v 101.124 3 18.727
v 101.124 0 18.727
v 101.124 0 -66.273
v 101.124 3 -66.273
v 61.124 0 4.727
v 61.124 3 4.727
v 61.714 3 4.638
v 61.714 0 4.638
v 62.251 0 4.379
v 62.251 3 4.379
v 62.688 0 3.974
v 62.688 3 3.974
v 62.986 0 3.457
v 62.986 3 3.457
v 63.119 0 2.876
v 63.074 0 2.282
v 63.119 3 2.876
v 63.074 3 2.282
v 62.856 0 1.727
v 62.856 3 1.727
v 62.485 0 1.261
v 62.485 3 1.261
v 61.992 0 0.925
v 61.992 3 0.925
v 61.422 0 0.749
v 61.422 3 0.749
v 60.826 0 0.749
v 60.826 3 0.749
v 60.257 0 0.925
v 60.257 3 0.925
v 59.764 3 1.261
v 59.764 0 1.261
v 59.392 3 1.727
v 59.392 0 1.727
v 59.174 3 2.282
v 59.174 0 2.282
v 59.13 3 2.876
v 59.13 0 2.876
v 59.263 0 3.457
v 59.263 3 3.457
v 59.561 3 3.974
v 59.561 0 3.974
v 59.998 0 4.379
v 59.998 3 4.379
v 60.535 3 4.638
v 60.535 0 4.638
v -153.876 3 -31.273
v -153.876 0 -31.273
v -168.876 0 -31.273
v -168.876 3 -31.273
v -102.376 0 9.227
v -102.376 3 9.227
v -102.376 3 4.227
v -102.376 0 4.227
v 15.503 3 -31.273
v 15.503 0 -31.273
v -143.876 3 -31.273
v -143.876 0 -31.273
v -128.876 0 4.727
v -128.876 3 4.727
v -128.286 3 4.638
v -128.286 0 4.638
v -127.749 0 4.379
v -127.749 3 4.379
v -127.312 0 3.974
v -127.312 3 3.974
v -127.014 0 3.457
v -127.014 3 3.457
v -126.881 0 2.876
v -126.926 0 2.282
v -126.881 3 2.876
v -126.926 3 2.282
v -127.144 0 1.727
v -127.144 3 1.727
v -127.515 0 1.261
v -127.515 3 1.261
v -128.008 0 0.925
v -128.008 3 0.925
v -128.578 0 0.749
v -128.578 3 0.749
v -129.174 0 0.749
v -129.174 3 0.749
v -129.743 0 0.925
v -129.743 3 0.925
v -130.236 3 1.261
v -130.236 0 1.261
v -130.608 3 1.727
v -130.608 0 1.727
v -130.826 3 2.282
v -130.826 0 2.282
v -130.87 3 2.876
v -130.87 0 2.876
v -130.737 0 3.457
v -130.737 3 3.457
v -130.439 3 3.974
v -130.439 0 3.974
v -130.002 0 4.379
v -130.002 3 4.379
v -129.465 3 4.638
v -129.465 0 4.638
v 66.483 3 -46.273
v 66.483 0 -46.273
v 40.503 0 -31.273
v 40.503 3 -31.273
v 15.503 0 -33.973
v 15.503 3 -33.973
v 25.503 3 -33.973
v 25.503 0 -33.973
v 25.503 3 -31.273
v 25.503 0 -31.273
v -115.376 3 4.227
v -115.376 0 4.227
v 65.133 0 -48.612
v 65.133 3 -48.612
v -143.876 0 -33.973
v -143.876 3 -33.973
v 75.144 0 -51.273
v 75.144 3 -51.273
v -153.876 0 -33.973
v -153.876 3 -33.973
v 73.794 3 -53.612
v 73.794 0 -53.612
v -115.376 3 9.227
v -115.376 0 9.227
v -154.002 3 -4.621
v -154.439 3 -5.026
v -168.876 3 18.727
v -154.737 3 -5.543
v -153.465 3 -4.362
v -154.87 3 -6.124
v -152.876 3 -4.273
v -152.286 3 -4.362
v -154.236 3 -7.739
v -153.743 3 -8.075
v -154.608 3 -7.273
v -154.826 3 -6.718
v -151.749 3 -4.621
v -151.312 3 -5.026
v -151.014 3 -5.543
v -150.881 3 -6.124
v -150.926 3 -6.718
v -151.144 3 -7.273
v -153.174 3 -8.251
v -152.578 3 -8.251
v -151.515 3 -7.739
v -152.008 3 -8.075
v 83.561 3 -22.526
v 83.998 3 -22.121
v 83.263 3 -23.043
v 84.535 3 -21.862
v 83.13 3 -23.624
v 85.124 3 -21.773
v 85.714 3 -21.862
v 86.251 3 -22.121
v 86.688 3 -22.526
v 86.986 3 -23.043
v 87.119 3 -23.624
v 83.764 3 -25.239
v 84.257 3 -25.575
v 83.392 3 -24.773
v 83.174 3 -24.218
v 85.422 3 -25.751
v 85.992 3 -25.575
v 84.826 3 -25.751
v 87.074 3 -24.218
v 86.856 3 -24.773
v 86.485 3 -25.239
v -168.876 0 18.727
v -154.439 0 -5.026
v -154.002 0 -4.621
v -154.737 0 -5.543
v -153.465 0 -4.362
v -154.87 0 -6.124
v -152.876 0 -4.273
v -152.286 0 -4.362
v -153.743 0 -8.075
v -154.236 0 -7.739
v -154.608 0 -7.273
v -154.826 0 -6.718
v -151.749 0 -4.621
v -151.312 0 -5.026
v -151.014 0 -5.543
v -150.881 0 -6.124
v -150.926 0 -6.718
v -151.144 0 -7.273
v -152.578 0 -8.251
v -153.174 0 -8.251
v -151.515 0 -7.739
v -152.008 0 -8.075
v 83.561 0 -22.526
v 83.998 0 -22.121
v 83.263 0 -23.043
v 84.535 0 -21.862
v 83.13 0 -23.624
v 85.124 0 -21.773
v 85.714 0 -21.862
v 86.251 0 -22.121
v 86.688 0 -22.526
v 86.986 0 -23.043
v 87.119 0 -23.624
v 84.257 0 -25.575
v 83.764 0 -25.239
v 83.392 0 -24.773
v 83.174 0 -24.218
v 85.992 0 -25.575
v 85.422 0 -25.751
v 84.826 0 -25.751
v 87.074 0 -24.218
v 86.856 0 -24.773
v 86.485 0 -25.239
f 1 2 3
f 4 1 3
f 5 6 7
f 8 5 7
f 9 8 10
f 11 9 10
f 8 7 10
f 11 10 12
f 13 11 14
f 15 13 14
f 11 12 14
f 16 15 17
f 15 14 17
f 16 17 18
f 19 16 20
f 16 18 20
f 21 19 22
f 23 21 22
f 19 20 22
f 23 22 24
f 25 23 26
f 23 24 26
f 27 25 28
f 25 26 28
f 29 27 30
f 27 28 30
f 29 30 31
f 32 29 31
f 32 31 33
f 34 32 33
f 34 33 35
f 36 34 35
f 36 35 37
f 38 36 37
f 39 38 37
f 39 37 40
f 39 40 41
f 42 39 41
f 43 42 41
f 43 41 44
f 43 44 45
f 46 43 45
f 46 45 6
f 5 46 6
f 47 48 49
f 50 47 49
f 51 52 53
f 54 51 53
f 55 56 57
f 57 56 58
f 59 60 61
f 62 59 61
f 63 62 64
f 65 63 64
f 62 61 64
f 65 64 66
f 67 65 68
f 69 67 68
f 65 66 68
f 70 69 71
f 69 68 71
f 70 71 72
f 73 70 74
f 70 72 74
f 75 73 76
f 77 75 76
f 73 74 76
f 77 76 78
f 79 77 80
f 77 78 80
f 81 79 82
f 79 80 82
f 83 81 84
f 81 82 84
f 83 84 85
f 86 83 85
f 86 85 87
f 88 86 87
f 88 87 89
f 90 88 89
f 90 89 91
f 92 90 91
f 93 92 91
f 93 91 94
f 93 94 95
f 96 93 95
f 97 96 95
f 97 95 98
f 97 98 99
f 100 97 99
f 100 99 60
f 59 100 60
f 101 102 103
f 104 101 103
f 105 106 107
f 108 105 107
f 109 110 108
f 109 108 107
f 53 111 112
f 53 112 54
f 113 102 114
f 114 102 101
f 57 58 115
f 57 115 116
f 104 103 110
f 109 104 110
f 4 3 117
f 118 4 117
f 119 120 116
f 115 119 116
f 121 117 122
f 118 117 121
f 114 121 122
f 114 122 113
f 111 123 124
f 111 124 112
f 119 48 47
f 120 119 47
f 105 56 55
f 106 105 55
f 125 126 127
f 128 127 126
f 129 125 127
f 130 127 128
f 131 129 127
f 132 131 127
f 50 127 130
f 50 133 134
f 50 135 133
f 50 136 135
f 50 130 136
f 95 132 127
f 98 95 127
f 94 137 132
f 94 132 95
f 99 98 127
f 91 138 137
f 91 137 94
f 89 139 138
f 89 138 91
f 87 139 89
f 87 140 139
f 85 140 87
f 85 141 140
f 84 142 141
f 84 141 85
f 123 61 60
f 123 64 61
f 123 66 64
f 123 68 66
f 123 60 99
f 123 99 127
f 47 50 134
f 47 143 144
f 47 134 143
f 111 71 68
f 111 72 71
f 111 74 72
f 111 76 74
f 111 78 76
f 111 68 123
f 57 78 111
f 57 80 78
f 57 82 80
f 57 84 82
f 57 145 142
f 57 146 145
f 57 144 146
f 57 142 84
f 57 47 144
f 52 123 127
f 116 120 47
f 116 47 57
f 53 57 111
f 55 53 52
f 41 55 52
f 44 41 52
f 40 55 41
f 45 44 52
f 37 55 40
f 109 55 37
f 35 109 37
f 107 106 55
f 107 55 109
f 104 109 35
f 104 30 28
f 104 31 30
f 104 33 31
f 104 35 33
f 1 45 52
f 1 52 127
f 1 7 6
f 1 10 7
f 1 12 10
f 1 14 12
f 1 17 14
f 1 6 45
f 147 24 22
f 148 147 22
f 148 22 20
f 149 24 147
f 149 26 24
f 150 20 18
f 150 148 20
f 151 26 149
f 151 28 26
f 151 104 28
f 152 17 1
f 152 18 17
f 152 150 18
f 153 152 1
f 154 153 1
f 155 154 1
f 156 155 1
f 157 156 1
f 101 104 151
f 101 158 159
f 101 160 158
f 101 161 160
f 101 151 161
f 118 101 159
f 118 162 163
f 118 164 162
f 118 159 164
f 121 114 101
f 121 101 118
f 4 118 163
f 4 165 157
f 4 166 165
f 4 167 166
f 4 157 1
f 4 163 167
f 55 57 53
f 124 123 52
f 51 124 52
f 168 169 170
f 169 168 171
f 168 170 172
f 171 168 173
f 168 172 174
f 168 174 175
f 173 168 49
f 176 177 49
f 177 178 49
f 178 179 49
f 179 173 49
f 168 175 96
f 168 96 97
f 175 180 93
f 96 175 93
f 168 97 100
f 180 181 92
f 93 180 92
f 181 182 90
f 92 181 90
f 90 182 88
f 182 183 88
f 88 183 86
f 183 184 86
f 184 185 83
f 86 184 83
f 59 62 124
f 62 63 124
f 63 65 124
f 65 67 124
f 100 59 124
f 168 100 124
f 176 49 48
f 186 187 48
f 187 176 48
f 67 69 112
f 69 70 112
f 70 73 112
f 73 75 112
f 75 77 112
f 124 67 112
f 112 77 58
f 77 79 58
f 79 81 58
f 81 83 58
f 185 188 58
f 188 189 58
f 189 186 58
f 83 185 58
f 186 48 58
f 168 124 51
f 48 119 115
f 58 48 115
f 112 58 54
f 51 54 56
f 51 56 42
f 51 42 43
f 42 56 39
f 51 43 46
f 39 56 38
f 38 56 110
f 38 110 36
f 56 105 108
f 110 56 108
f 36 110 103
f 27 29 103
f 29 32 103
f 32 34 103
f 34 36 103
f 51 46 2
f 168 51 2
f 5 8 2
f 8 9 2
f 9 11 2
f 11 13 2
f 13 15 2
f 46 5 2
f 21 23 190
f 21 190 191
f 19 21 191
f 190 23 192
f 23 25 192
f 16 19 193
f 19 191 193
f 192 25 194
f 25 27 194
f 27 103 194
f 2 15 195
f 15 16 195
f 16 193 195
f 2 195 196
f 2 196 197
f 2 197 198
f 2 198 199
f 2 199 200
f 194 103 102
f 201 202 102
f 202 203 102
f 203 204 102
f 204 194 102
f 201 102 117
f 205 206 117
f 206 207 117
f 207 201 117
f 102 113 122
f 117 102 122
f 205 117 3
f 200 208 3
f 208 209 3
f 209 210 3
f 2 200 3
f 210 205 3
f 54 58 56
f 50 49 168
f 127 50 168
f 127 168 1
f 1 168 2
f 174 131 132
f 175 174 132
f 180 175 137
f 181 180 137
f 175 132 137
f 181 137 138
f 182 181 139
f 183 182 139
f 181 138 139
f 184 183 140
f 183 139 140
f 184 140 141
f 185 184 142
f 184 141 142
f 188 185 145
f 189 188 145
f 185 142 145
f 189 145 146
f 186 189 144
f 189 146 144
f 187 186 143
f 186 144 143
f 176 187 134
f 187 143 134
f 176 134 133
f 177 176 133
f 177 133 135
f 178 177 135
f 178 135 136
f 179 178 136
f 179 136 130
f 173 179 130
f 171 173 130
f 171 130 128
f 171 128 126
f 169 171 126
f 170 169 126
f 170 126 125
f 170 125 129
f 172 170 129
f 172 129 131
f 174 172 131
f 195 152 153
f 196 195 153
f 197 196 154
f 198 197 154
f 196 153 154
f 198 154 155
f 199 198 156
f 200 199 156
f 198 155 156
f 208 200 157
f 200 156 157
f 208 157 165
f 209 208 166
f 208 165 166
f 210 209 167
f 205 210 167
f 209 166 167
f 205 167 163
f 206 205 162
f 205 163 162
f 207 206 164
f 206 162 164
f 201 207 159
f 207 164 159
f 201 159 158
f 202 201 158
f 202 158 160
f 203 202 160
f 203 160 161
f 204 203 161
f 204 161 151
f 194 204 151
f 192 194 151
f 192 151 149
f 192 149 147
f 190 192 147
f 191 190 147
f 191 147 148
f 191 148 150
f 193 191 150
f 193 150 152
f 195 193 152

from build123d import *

# Parameters (mm, degrees)
BOSS_EXTRUDE1_DEPTH = 3
CUT_EXTRUDE1_REACH  = 5
SKETCH2_R           = 2
CUT_EXTRUDE2_REACH  = 5
SKETCH3_R           = 2
SKETCH4_W           = 10
SKETCH4_H           = 3
BOSS_EXTRUDE3_DEPTH = 2.7
SKETCH5_W           = 10
SKETCH5_H           = 3
BOSS_EXTRUDE4_DEPTH = 2.7
CUT_EXTRUDE3_REACH  = 5
SKETCH6_W           = 13
SKETCH6_H           = 5


with BuildPart() as part:
    # Sketch1 → Boss-Extrude1 (new body)
    with BuildSketch(Plane(origin=(0, 0, 0), x_dir=(1, 0, 0), z_dir=(0, 1, 0))):
        Polygon((101.124303582, 11.213732055), (101.124303582, 66.273277114), (40.502525317, 31.273277114), (-168.875696418, 31.273277114), (-168.875696418, -18.726722886), (101.124303582, -18.726722886), align=None)
    extrude(amount=BOSS_EXTRUDE1_DEPTH)

    # Sketch2 → Cut-Extrude1 (cut, up to next)
    with BuildSketch(Plane(origin=(0, 3, 0), x_dir=(1, 0, 0), z_dir=(0, 1, 0)), mode=Mode.PRIVATE) as cut_extrude1_sk1:
        with Locations(Location((-152.875696418, 6.273277114, 0), (0, 0, 270))):  # turned: the seam where the file's is
            Circle(SKETCH2_R)
    cut_extrude1_tool1 = extrude(cut_extrude1_sk1.sketch, amount=-CUT_EXTRUDE1_REACH, mode=Mode.PRIVATE) & part.part
    add(cut_extrude1_tool1.solids().sort_by_distance((-152.875696, 3, -6.273277))[0], mode=Mode.SUBTRACT)
    # Sketch2 → Cut-Extrude1 (cut, up to next)
    with BuildSketch(Plane(origin=(0, 3, 0), x_dir=(1, 0, 0), z_dir=(0, 1, 0)), mode=Mode.PRIVATE) as cut_extrude1_sk2:
        with Locations(Location((85.124303582, 23.773277114, 0), (0, 0, 270))):  # turned: the seam where the file's is
            Circle(SKETCH2_R)
    cut_extrude1_tool2 = extrude(cut_extrude1_sk2.sketch, amount=-CUT_EXTRUDE1_REACH, mode=Mode.PRIVATE) & part.part
    add(cut_extrude1_tool2.solids().sort_by_distance((85.124304, 3, -23.773277))[0], mode=Mode.SUBTRACT)

    # Sketch3 → Cut-Extrude2 (cut, up to next)
    with BuildSketch(Plane(origin=(0, 3, 0), x_dir=(1, 0, 0), z_dir=(0, 1, 0)), mode=Mode.PRIVATE) as cut_extrude2_sk1:
        with Locations(Location((-128.875696418, -2.726722886, 0), (0, 0, 270))):  # turned: the seam where the file's is
            Circle(SKETCH3_R)
    cut_extrude2_tool1 = extrude(cut_extrude2_sk1.sketch, amount=-CUT_EXTRUDE2_REACH, mode=Mode.PRIVATE) & part.part
    add(cut_extrude2_tool1.solids().sort_by_distance((-128.875696, 3, 2.726723))[0], mode=Mode.SUBTRACT)
    # Sketch3 → Cut-Extrude2 (cut, up to next)
    with BuildSketch(Plane(origin=(0, 3, 0), x_dir=(1, 0, 0), z_dir=(0, 1, 0)), mode=Mode.PRIVATE) as cut_extrude2_sk2:
        with Locations(Location((61.124303582, -2.726722886, 0), (0, 0, 270))):  # turned: the seam where the file's is
            Circle(SKETCH3_R)
    cut_extrude2_tool2 = extrude(cut_extrude2_sk2.sketch, amount=-CUT_EXTRUDE2_REACH, mode=Mode.PRIVATE) & part.part
    add(cut_extrude2_tool2.solids().sort_by_distance((61.124304, 3, 2.726723))[0], mode=Mode.SUBTRACT)

    # Sketch4 → Boss-Extrude3 (add)
    with BuildSketch(Plane.XY.offset(-31.273277114)):
        with Locations((-148.875696418, 1.5)):
            Rectangle(SKETCH4_W, SKETCH4_H)
        with Locations((20.502525317, 1.5)):
            Rectangle(SKETCH4_W, SKETCH4_H)
    extrude(amount=-BOSS_EXTRUDE3_DEPTH)

    # Sketch5 → Boss-Extrude4 (add)
    with BuildSketch(Plane(origin=(-3.416094891, 0, -5.916849915), x_dir=(-0.866025404, 0, 0.5), z_dir=(-0.5, 0, -0.866025404))):
        with Locations((-85.712854399, 1.5)):
            Rectangle(SKETCH5_W, SKETCH5_H)
    extrude(amount=BOSS_EXTRUDE4_DEPTH)

    # Sketch6 → Cut-Extrude3 (cut, up to next)
    with BuildSketch(Plane(origin=(0, 3, 0), x_dir=(1, 0, 0), z_dir=(0, 1, 0)), mode=Mode.PRIVATE) as cut_extrude3_sk1:
        with Locations((-108.875696418, -6.726722886)):
            Rectangle(SKETCH6_W, SKETCH6_H)
    cut_extrude3_tool1 = extrude(cut_extrude3_sk1.sketch, amount=-CUT_EXTRUDE3_REACH, mode=Mode.PRIVATE) & part.part
    add(cut_extrude3_tool1.solids().sort_by_distance((-108.875696, 3, 6.726723))[0], mode=Mode.SUBTRACT)


solid = part.part
